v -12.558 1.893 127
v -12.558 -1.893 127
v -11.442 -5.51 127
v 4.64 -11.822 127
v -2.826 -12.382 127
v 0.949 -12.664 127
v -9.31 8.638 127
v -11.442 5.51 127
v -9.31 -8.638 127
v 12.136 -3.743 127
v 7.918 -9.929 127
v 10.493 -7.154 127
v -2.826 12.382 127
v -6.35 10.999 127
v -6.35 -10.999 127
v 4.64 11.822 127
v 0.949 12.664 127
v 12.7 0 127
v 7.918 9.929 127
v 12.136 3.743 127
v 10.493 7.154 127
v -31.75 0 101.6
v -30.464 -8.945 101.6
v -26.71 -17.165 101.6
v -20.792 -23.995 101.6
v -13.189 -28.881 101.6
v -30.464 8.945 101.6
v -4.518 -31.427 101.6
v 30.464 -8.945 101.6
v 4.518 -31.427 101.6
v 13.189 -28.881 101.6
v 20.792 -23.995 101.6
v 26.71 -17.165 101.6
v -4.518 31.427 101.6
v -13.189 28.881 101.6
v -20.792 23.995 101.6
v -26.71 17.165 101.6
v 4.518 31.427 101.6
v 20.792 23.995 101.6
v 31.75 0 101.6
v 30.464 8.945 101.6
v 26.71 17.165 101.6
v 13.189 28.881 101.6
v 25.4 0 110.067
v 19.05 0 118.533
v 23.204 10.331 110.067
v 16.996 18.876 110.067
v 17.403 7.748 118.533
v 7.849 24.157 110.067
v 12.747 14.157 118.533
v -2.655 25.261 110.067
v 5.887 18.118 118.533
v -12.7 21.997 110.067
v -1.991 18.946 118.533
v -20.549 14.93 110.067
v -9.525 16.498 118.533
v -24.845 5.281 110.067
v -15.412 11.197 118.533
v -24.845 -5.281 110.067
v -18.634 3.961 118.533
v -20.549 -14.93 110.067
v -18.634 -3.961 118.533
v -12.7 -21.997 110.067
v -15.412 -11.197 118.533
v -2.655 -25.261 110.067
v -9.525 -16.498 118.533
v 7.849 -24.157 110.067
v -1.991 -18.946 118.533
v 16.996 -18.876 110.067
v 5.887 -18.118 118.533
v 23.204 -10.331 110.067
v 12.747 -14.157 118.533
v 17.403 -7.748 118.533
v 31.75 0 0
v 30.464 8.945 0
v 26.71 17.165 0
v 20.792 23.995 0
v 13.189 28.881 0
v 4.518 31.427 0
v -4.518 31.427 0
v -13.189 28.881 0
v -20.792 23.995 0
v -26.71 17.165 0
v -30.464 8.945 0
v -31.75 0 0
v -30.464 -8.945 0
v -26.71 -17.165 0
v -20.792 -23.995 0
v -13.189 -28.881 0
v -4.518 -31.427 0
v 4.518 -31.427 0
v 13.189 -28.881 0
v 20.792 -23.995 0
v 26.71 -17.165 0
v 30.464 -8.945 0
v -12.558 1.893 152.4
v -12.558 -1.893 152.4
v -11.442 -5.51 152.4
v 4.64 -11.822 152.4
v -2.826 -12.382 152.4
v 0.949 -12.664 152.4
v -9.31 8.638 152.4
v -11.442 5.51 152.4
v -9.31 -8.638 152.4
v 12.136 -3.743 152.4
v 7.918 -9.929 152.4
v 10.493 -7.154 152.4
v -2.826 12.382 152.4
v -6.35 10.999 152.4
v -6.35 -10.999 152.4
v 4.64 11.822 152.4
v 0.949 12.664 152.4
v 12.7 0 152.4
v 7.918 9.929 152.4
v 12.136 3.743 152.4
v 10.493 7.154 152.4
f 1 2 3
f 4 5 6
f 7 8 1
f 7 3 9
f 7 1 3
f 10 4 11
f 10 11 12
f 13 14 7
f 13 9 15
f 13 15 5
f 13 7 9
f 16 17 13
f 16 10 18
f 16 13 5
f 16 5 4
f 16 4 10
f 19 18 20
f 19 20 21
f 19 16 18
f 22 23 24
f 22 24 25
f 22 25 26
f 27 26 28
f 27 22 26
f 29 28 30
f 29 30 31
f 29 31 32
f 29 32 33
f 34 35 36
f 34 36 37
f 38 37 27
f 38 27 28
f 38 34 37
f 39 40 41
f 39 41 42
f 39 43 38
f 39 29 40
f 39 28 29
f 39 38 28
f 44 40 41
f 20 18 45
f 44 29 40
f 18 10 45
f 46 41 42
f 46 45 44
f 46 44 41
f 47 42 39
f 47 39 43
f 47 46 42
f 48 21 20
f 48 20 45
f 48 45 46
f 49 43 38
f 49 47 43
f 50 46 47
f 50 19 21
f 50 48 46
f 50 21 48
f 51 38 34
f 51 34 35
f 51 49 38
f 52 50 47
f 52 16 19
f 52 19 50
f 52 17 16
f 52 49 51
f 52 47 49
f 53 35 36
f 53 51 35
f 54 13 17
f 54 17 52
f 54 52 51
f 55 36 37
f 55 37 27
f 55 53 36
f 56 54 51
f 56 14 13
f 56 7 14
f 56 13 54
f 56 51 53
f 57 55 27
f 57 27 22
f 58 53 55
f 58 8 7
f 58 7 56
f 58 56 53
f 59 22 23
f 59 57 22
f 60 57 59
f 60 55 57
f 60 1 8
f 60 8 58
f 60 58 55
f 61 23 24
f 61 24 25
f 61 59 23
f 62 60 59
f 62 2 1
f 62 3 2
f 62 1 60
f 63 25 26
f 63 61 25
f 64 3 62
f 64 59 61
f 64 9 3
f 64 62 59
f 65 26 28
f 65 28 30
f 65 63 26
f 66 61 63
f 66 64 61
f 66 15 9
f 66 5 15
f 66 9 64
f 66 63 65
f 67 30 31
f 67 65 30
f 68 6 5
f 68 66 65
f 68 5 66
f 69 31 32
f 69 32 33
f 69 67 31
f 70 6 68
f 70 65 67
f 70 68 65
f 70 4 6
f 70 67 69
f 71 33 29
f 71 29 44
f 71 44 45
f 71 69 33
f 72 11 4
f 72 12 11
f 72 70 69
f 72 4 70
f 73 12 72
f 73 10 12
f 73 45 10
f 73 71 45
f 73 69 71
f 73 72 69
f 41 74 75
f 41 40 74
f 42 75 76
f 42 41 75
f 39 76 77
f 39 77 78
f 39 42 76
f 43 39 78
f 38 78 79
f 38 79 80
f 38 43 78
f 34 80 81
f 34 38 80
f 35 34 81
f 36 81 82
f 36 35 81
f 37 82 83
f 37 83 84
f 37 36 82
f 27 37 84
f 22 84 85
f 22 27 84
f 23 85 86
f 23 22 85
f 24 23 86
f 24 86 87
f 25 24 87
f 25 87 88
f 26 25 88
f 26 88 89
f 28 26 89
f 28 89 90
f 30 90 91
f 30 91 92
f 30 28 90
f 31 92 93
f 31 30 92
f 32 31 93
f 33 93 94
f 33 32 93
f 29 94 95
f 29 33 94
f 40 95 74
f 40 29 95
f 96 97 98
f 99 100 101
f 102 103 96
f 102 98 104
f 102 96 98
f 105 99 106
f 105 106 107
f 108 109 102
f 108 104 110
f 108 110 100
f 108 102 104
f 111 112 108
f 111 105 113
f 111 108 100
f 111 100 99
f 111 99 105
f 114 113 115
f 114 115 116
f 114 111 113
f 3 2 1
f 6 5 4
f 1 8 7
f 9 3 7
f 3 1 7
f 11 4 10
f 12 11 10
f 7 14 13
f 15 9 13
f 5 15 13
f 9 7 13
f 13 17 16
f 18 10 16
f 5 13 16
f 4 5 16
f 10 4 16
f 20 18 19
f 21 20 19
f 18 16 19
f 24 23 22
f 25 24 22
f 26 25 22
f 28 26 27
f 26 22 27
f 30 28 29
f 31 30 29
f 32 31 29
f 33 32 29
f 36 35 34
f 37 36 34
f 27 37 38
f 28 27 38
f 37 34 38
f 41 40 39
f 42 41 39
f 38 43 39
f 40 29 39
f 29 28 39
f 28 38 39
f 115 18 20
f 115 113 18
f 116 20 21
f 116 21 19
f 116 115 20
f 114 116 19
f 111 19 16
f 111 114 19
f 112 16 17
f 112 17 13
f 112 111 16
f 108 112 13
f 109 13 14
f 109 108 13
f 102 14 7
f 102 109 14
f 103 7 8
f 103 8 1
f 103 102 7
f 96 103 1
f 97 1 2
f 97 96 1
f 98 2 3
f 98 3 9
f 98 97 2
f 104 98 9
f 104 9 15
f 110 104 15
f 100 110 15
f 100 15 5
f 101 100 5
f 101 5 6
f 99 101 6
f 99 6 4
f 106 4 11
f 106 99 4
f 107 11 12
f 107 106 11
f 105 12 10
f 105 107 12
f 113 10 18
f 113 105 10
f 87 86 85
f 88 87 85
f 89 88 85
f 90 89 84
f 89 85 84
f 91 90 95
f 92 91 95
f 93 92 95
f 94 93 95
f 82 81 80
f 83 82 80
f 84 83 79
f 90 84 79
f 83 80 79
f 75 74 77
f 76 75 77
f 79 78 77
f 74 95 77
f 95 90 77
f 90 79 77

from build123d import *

# Parameters (mm, degrees)
F4_R = 12.7
F6_R = 12.7
F0_R = 31.75
F2_R = 31.75


with BuildPart() as f7:
    # F4 (on offset) → F7 section 0
    with BuildSketch(Plane.XY.offset(127)):
        Circle(F4_R)
    # F6 (on offset) → F7 section 1
    with BuildSketch(Plane.XY.offset(152.4)):
        Circle(F6_R)
    loft()


with BuildPart() as f8:
    # F0 (on Top) → F8 section 0
    with BuildSketch(Plane.XY):
        Circle(F0_R)
    # F2 (on offset) → F8 section 1
    with BuildSketch(Plane.XY.offset(101.6)):
        Circle(F2_R)
    loft()


with BuildPart() as f9:
    # F2 (on offset) → F9 section 0
    with BuildSketch(Plane.XY.offset(101.6)):
        Circle(F2_R)
    # F4 (on offset) → F9 section 1
    with BuildSketch(Plane.XY.offset(127)):
        Circle(F4_R)
    loft()


solid = Compound([f7.part, f8.part, f9.part])
